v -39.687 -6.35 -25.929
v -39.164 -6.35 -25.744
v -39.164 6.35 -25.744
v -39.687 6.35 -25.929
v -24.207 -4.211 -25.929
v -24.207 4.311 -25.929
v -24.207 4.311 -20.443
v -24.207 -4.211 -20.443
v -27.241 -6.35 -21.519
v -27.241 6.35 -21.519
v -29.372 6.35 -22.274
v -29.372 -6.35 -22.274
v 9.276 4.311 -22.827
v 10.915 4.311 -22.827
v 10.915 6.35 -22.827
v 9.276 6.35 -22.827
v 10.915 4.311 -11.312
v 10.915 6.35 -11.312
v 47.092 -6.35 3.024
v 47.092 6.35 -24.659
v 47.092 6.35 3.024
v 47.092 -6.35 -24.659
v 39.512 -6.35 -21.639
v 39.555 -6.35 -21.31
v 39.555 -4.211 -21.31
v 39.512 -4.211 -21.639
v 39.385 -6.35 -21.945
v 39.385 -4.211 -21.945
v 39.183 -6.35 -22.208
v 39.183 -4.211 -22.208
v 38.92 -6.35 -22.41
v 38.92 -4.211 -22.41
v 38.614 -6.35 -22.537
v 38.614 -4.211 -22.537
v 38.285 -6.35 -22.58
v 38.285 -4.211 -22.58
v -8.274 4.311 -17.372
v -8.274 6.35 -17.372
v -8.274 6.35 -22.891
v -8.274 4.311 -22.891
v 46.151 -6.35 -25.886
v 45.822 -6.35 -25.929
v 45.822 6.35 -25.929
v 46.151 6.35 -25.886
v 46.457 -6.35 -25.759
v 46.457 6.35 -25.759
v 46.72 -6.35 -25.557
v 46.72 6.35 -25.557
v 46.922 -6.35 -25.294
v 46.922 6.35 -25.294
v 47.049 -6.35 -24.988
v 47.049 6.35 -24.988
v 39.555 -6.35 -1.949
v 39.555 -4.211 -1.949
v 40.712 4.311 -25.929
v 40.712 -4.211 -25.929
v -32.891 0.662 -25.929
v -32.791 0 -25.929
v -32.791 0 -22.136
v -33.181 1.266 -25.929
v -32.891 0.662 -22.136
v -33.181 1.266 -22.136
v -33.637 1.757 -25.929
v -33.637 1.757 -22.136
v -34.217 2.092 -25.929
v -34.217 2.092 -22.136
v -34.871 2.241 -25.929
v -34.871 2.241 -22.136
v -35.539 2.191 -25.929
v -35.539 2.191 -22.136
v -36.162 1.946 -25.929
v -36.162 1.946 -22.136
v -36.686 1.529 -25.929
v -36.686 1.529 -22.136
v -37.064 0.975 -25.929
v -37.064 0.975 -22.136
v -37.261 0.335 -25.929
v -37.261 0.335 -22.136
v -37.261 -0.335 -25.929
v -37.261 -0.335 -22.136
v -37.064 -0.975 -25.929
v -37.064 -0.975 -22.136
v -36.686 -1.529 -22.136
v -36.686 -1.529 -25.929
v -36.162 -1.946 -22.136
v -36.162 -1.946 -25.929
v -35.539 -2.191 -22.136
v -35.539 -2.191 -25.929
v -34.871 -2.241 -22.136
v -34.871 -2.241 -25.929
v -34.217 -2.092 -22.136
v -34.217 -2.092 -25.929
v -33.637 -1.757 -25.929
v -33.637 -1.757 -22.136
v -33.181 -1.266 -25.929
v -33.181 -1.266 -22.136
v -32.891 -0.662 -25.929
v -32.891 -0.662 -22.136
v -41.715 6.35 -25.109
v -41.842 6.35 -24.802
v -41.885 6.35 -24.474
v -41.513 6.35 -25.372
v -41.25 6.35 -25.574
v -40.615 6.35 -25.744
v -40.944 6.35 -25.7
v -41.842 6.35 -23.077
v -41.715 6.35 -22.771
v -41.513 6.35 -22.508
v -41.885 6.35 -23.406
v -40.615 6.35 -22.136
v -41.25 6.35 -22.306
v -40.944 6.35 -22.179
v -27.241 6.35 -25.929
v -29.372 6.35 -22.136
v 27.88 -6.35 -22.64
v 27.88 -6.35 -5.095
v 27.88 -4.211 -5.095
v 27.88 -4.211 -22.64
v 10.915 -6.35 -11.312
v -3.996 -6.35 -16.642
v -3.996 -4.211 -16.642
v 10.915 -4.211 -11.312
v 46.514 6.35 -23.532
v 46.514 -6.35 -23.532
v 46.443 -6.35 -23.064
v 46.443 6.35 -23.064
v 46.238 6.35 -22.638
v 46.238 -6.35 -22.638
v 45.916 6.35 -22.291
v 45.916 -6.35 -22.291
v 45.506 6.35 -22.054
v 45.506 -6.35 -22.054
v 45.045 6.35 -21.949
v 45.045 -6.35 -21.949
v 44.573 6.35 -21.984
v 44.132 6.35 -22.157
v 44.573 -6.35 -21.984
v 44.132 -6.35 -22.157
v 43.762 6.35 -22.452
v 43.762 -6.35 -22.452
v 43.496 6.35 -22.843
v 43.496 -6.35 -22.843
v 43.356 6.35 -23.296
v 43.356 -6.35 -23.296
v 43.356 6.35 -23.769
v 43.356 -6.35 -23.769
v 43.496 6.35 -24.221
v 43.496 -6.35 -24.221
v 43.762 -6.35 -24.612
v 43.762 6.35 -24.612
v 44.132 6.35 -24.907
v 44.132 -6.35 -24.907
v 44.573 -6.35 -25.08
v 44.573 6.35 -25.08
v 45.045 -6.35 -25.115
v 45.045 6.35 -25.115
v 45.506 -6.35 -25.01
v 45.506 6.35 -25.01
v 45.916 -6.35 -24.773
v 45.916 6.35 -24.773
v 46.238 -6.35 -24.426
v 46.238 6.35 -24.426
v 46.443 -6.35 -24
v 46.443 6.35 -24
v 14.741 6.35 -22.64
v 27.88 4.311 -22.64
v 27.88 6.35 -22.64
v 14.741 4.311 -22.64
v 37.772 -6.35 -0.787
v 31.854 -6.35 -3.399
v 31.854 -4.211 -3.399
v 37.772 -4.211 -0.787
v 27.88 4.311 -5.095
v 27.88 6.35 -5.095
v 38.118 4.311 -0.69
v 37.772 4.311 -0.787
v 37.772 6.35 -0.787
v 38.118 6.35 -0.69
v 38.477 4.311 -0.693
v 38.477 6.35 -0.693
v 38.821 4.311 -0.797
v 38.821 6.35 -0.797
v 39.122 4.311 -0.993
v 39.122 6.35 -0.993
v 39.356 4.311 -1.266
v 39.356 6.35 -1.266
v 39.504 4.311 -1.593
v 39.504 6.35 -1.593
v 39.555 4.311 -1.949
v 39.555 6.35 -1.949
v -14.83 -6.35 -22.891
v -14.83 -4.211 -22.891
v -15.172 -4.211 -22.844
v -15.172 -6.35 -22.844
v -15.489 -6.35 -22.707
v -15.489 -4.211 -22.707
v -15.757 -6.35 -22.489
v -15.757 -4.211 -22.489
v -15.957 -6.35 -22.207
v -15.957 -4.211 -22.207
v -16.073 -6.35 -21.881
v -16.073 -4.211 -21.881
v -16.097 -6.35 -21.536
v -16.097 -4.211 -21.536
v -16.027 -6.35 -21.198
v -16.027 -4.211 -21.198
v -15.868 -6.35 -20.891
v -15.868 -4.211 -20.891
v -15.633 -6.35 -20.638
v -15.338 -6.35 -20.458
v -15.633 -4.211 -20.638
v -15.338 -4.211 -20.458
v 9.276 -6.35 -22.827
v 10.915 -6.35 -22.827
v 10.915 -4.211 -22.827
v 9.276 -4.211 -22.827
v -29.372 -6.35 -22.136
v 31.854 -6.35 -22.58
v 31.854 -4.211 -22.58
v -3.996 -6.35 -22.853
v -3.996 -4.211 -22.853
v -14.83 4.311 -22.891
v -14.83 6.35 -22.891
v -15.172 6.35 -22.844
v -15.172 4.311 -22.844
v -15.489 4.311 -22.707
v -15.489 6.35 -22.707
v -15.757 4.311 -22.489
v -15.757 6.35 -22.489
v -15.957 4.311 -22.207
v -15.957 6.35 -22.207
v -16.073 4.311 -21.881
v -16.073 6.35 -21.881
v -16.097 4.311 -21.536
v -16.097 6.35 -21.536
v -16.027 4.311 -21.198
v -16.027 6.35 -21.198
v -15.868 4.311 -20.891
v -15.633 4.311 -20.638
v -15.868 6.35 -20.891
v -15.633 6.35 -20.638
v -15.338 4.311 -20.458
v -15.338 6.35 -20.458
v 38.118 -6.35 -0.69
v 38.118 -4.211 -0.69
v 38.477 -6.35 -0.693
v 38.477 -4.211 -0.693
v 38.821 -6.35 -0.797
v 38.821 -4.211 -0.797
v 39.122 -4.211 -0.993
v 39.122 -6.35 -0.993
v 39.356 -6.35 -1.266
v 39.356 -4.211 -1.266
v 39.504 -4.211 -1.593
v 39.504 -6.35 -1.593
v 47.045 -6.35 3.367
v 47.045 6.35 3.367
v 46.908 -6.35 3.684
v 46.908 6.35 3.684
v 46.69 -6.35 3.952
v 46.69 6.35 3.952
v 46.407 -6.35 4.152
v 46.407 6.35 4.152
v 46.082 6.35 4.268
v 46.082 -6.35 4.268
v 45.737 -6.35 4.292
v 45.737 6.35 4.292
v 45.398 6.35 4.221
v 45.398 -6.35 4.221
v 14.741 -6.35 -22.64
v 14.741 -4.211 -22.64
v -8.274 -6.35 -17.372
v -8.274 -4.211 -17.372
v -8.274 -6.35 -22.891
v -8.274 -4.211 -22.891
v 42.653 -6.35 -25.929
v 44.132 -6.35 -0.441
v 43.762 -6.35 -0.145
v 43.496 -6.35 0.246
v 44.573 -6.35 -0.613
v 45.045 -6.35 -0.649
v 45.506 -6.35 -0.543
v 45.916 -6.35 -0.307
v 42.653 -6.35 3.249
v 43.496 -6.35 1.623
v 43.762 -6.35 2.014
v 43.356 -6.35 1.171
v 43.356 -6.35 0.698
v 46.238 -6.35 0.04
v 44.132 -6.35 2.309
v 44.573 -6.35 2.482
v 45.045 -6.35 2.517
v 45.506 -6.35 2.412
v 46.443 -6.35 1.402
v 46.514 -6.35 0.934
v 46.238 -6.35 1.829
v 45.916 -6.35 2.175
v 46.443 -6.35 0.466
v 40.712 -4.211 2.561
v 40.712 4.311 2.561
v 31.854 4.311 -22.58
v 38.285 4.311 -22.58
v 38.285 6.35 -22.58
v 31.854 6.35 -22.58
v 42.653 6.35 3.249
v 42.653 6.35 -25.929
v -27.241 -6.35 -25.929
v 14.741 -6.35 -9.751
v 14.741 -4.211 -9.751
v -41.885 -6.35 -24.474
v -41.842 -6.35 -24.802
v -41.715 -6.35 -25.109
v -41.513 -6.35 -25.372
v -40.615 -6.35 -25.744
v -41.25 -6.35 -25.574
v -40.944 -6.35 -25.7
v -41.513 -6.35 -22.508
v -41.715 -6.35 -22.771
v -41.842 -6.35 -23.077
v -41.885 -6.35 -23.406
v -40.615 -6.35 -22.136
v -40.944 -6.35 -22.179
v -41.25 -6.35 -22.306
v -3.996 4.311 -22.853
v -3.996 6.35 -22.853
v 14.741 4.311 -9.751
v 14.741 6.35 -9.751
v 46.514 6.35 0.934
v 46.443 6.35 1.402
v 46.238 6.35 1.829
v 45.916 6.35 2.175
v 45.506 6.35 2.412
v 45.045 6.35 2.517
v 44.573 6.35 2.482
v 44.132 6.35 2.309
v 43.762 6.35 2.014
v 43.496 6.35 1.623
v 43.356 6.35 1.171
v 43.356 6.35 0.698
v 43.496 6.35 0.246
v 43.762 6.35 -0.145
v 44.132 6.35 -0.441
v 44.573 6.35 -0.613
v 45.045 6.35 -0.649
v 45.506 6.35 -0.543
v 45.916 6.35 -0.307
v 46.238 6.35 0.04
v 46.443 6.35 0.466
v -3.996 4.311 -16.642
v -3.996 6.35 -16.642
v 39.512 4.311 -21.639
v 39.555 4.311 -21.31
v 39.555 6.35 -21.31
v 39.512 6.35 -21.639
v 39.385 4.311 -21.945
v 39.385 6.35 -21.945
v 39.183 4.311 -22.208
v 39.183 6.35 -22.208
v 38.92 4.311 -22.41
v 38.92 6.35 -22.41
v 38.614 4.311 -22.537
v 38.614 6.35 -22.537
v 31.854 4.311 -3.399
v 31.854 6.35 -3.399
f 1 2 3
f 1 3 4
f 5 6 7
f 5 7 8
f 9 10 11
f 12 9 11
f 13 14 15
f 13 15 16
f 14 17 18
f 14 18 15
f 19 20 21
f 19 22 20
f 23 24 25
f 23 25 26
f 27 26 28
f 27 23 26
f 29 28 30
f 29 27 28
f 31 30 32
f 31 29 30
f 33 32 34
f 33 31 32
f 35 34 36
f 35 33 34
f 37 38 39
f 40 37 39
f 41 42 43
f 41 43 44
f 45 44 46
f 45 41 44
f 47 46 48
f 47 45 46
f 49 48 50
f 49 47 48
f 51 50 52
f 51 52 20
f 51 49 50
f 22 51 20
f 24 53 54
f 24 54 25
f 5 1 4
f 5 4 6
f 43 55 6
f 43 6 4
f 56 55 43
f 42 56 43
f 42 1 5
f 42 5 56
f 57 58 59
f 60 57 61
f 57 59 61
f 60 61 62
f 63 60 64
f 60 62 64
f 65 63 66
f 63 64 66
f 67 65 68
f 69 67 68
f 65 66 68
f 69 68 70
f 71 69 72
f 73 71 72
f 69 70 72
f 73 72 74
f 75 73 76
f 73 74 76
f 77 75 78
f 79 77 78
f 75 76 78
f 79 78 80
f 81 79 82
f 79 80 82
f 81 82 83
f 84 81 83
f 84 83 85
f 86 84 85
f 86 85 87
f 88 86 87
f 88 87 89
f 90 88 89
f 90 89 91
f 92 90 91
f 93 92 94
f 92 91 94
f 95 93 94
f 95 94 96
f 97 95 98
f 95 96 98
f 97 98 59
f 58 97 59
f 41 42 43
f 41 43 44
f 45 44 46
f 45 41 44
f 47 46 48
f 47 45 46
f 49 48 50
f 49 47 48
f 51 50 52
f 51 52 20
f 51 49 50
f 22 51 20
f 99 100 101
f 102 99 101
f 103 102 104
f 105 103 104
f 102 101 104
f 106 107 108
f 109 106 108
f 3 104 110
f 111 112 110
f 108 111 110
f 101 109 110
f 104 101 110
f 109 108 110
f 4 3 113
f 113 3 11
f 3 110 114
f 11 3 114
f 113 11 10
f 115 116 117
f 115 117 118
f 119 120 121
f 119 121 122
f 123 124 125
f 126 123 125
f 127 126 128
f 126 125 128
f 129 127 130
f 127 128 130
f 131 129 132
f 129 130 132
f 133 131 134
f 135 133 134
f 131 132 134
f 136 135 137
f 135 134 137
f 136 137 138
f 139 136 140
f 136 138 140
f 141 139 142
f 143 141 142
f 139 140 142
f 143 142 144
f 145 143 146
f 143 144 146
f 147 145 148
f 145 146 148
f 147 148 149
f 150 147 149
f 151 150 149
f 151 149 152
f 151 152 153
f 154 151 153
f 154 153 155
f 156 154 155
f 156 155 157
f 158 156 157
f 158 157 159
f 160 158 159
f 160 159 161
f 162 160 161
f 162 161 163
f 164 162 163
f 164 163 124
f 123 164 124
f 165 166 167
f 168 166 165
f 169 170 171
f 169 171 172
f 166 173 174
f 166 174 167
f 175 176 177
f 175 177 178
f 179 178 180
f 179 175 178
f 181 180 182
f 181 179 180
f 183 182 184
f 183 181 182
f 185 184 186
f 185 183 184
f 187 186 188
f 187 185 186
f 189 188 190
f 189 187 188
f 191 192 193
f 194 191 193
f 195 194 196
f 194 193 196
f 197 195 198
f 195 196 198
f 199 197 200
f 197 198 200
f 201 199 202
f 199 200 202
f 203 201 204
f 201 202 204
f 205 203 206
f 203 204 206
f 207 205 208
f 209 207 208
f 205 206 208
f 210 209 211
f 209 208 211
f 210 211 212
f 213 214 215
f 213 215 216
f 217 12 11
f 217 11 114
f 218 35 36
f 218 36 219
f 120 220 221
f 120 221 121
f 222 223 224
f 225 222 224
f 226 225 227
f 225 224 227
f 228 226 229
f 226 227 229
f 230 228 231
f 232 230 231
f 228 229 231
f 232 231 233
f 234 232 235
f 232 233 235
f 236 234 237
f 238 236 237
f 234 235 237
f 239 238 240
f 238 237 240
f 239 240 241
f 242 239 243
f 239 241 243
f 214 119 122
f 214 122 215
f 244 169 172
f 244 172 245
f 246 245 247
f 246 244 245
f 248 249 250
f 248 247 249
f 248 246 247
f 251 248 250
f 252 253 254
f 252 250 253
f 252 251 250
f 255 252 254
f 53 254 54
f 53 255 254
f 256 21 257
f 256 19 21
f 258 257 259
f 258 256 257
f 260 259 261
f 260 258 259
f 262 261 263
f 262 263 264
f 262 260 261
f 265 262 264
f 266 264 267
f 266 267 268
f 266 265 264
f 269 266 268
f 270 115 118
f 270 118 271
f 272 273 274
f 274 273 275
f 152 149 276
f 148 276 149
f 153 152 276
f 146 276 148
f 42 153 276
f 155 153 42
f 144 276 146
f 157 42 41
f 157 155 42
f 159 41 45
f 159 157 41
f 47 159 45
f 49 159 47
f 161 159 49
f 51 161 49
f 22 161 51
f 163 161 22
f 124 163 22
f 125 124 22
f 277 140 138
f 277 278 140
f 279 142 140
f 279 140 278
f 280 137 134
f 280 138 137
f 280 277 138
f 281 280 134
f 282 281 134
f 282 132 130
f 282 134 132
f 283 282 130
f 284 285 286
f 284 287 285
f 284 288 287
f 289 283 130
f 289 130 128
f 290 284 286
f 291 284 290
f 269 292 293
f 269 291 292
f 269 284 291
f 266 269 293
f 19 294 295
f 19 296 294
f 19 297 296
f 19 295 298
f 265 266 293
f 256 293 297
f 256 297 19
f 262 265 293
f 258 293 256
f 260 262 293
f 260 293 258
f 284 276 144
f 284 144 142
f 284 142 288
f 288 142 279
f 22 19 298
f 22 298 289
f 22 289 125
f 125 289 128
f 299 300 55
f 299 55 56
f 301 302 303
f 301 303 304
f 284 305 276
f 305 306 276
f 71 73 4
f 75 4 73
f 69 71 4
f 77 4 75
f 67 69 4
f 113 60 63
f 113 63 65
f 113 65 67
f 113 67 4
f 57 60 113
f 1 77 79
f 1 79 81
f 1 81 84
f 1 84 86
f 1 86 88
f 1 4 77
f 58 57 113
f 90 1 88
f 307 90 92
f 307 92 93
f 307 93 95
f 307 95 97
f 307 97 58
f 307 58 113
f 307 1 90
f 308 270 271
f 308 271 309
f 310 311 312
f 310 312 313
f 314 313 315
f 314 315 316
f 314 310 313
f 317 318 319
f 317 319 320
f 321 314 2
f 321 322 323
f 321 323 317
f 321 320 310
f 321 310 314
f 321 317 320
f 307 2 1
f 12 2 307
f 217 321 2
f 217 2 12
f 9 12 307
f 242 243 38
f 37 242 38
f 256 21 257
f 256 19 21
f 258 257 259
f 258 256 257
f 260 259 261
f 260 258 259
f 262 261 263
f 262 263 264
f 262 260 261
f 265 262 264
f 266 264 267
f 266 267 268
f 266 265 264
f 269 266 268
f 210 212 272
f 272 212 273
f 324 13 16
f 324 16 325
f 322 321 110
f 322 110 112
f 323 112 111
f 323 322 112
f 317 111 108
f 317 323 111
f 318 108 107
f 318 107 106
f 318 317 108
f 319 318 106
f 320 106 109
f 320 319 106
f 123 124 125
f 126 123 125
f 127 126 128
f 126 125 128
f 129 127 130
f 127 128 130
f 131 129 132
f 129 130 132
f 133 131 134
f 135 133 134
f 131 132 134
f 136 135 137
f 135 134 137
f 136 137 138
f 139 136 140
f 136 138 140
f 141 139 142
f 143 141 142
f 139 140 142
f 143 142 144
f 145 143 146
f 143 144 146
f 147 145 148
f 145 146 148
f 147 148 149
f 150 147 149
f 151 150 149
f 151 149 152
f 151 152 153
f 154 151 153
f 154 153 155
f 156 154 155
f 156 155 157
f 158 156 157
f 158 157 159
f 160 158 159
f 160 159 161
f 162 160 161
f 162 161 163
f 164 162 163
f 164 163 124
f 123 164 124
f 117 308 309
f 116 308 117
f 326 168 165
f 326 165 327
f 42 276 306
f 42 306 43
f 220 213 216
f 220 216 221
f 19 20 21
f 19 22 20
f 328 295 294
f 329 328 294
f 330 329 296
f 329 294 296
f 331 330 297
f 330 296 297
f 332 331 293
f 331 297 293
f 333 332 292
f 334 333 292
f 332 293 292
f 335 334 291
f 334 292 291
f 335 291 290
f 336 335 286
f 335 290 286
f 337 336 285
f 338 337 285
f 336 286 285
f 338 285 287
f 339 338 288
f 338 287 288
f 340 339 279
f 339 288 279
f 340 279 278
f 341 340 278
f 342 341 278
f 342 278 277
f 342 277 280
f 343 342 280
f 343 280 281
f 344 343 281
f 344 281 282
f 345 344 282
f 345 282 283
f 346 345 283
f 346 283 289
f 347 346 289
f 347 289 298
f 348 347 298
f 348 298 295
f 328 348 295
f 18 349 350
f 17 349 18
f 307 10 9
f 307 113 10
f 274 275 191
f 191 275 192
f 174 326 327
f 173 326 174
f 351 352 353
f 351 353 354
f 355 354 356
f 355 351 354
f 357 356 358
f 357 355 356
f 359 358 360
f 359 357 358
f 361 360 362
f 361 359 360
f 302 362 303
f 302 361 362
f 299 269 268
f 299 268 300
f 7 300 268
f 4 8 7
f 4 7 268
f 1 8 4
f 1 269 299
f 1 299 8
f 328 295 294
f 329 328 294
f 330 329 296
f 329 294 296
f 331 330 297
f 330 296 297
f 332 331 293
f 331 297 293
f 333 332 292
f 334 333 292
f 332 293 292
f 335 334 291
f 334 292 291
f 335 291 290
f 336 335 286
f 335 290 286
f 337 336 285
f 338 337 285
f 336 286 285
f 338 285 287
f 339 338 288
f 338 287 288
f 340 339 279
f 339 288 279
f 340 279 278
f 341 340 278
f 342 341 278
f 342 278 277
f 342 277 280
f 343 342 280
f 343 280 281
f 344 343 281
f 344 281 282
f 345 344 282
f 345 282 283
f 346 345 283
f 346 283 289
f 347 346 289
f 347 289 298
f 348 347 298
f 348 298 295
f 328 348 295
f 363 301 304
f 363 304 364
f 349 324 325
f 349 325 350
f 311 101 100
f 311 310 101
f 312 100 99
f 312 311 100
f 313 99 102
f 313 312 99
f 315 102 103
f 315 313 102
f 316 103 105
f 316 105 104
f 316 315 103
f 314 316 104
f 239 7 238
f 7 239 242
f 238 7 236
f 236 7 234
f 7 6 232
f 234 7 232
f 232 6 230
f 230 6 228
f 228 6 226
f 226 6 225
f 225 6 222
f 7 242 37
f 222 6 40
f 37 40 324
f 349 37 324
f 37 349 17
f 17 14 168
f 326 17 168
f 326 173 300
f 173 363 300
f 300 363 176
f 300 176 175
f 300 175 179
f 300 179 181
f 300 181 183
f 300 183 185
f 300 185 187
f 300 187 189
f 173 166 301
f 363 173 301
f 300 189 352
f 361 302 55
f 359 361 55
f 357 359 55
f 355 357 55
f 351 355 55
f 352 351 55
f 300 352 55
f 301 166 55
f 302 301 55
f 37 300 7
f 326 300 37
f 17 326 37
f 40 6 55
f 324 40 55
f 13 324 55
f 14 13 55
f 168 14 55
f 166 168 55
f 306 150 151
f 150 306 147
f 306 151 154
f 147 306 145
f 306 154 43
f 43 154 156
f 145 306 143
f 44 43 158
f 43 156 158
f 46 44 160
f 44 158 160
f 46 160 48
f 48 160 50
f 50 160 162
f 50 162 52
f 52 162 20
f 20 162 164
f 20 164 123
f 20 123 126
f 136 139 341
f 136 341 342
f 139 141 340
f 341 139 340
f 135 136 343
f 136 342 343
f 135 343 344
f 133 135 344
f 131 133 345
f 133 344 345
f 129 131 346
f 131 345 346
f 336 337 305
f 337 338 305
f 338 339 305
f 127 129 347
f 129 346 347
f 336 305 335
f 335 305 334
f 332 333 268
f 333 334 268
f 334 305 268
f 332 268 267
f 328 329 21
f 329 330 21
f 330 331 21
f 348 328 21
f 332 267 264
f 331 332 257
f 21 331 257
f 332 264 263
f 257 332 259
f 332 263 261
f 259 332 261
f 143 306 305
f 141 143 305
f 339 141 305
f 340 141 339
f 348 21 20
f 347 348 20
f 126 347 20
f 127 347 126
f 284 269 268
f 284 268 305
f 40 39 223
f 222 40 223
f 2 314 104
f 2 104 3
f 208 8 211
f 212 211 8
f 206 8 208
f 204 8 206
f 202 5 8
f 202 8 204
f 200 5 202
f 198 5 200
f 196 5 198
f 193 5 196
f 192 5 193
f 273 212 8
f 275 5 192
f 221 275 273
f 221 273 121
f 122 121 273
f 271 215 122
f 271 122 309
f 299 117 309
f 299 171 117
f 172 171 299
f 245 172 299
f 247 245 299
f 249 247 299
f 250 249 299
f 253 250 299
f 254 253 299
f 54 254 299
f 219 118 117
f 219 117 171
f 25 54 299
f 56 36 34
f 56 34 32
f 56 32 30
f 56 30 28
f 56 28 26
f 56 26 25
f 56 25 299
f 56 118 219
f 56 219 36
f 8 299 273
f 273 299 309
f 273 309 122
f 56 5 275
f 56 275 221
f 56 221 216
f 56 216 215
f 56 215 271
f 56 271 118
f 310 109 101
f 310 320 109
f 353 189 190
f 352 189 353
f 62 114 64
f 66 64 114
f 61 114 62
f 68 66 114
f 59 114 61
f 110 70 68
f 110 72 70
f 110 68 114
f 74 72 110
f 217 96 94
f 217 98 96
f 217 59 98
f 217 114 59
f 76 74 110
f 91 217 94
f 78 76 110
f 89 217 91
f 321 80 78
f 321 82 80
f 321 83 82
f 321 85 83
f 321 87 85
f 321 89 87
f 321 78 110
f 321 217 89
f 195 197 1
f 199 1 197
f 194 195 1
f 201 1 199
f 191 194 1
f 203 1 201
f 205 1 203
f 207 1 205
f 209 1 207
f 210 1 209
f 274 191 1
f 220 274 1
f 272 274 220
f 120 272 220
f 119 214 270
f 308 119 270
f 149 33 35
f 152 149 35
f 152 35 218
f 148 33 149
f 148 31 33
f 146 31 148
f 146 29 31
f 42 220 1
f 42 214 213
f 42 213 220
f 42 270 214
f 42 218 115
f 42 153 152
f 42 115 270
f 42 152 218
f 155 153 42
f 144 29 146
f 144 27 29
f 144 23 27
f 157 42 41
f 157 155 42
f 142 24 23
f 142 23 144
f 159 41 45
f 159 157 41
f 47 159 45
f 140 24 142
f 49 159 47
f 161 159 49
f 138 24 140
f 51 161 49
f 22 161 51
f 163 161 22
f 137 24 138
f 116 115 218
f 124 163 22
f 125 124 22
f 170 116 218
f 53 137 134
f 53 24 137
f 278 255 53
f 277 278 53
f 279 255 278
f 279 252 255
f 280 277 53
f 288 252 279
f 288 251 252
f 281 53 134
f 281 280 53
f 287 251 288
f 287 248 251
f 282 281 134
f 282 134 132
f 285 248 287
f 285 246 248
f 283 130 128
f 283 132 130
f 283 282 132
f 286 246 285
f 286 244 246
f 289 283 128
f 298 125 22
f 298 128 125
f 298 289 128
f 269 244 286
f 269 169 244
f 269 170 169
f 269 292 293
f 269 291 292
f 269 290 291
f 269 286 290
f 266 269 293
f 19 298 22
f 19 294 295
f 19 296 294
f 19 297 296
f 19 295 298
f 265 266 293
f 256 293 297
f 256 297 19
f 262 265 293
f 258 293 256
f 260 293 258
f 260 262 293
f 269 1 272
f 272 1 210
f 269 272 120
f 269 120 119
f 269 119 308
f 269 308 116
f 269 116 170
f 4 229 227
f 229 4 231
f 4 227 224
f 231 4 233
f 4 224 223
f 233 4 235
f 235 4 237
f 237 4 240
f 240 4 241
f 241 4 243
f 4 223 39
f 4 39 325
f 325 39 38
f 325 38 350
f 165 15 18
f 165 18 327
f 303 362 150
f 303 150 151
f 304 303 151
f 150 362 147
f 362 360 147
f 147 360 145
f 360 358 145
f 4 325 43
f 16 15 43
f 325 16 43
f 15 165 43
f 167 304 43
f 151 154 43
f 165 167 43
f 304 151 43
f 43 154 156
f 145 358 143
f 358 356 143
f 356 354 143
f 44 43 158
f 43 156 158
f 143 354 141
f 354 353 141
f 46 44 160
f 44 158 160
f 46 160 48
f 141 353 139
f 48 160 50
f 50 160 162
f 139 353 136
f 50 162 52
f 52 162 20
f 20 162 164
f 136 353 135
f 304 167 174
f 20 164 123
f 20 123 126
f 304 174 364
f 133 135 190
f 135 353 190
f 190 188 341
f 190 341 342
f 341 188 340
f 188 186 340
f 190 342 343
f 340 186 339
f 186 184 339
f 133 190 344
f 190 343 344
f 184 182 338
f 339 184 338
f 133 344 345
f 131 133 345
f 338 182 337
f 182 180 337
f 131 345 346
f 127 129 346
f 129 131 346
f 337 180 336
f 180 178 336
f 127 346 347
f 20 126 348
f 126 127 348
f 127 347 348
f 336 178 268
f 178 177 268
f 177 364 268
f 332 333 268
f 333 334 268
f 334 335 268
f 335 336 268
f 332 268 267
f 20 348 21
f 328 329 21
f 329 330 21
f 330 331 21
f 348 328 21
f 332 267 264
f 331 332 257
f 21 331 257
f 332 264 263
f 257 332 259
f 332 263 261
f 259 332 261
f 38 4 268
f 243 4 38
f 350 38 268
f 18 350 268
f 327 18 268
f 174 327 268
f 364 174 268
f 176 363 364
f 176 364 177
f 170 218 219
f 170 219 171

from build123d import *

# Parameters (mm, degrees)
F1_DEPTH  = 6.35
F2_W      = 69.893825
F2_H      = 16.123052
F3_DEPTH  = 127
F5_DEPTH  = 6.35
F6_R      = 2.247621
F7_DEPTH  = 127
F8_DEPTH  = 6.35
F9_W      = 64.918967
F9_H      = 8.522147
F10_DEPTH = 127
F12_DEPTH = 127
F13_R     = 1.587517
F14_DEPTH = 25.4


with BuildPart() as f1:
    # F0 (on Front) → F1 (new body, symmetric)
    with BuildSketch(Plane.XZ):
        with BuildLine():
            Line((45.39823, 4.221463), (-39.687499, -25.929166))
            Line((-39.687499, -25.929166), (45.822417, -25.929166))
            ThreePointArc((45.822417, -25.929166), (46.720443, -25.557192), (47.092417, -24.659166))
            Line((47.092417, -24.659166), (47.092417, 3.024398))
            ThreePointArc((47.092417, 3.024398), (46.555282, 4.06161), (45.39823, 4.221463))
        make_face()
    extrude(amount=F1_DEPTH, both=True)

    # F2 (on face) → F3 (cut, symmetric)
    with BuildSketch(Plane(origin=(0, 0, -25.929166), x_dir=(1, 0, 0), z_dir=(0, 0, -1))):
        with Locations((7.705728, -0.124026)):
            Rectangle(F2_W, F2_H)
    extrude(amount=F3_DEPTH, both=True, mode=Mode.SUBTRACT)

    # F4 (on Front) → F5 (join, symmetric)
    with BuildSketch(Plane.XZ):
        with BuildLine():
            Line((-40.614877, -25.743729), (-29.372381, -25.743729))
            Line((-29.372381, -25.743729), (-29.372381, -22.135654))
            Line((-29.372381, -22.135654), (-40.614877, -22.135654))
            ThreePointArc((-40.614877, -22.135654), (-41.512902, -22.507629), (-41.884877, -23.405654))
            Line((-41.884877, -23.405654), (-41.884877, -24.473729))
            ThreePointArc((-41.884877, -24.473729), (-41.512902, -25.371754), (-40.614877, -25.743729))
        make_face()
    extrude(amount=F5_DEPTH, both=True)

    # F6 (on face) → F7 (cut, symmetric)
    with BuildSketch(Plane.XY.offset(-22.135654)):
        with Locations((-35.038486, 0)):
            Circle(F6_R)
    extrude(amount=F7_DEPTH, both=True, mode=Mode.SUBTRACT)


with BuildPart() as f8:
    # F0 (on Front) → F8 (new body, symmetric)
    with BuildSketch(Plane.XZ):
        with BuildLine():
            Line((45.39823, 4.221463), (-39.687499, -25.929166))
            Line((-39.687499, -25.929166), (45.822417, -25.929166))
            ThreePointArc((45.822417, -25.929166), (46.720443, -25.557192), (47.092417, -24.659166))
            Line((47.092417, -24.659166), (47.092417, 3.024398))
            ThreePointArc((47.092417, 3.024398), (46.555282, 4.06161), (45.39823, 4.221463))
        make_face()
    extrude(amount=F8_DEPTH, both=True)

    # F9 (on face) → F10 (cut, symmetric)
    with BuildSketch(Plane(origin=(0, 0, -25.929166), x_dir=(1, 0, 0), z_dir=(0, 0, -1))):
        with Locations((8.252915, -0.050055)):
            Rectangle(F9_W, F9_H)
    extrude(amount=F10_DEPTH, both=True, mode=Mode.SUBTRACT)

    # F11 (on face) → F12 (cut, symmetric)
    with BuildSketch(Plane(origin=(0, 6.35, 0), x_dir=(-1, 0, 0), z_dir=(0, 1, 0))):
        with BuildLine():
            Line((-39.555151, -1.948701), (-39.555151, -21.310246))
            ThreePointArc((-39.555151, -21.310246), (-39.183177, -22.208271), (-38.285151, -22.580246))
            Line((-38.285151, -22.580246), (-31.853887, -22.580246))
            Line((-31.853887, -22.580246), (-31.853887, -3.398931))
            Line((-31.853887, -3.398931), (-37.772362, -0.786829))
            ThreePointArc((-37.772362, -0.786829), (-38.978569, -0.884713), (-39.555151, -1.948701))
        make_face()
        Polygon((-27.880348, -5.095216), (-27.880348, -22.640249), (-14.741216, -22.640249), (-14.741216, -9.751145), align=None)
        Polygon((-10.91465, -11.312036), (-10.91465, -22.827342), (-9.275836, -22.827342), (3.996369, -22.852853), (3.996369, -16.642382), align=None)
        with BuildLine():
            Line((8.274352, -17.371807), (8.274352, -22.891384))
            Line((8.274352, -22.891384), (14.829625, -22.891384))
            ThreePointArc((14.829625, -22.891384), (16.072791, -21.881074), (15.338032, -20.457587))
            Line((15.338032, -20.457587), (8.274352, -17.371807))
        make_face()
    extrude(amount=F12_DEPTH, both=True, mode=Mode.SUBTRACT)


with BuildPart() as f14_tool:
    # F13 (on face) → F14 (new body)
    with BuildSketch(Plane.XZ.offset(6.35)):
        with Locations((44.92614, 0.934323)):
            Circle(F13_R)
        with Locations((44.92614, -23.532137)):
            Circle(F13_R)
    extrude(amount=-F14_DEPTH)


with BuildPart() as f1_1:
    add(f1.part)

    # F14: cut by f14_tool
    add(f14_tool.part, mode=Mode.SUBTRACT)


with BuildPart() as f8_1:
    add(f8.part)

    # F14: cut by f14_tool
    add(f14_tool.part, mode=Mode.SUBTRACT)


solid = Compound([f1_1.part, f8_1.part])
